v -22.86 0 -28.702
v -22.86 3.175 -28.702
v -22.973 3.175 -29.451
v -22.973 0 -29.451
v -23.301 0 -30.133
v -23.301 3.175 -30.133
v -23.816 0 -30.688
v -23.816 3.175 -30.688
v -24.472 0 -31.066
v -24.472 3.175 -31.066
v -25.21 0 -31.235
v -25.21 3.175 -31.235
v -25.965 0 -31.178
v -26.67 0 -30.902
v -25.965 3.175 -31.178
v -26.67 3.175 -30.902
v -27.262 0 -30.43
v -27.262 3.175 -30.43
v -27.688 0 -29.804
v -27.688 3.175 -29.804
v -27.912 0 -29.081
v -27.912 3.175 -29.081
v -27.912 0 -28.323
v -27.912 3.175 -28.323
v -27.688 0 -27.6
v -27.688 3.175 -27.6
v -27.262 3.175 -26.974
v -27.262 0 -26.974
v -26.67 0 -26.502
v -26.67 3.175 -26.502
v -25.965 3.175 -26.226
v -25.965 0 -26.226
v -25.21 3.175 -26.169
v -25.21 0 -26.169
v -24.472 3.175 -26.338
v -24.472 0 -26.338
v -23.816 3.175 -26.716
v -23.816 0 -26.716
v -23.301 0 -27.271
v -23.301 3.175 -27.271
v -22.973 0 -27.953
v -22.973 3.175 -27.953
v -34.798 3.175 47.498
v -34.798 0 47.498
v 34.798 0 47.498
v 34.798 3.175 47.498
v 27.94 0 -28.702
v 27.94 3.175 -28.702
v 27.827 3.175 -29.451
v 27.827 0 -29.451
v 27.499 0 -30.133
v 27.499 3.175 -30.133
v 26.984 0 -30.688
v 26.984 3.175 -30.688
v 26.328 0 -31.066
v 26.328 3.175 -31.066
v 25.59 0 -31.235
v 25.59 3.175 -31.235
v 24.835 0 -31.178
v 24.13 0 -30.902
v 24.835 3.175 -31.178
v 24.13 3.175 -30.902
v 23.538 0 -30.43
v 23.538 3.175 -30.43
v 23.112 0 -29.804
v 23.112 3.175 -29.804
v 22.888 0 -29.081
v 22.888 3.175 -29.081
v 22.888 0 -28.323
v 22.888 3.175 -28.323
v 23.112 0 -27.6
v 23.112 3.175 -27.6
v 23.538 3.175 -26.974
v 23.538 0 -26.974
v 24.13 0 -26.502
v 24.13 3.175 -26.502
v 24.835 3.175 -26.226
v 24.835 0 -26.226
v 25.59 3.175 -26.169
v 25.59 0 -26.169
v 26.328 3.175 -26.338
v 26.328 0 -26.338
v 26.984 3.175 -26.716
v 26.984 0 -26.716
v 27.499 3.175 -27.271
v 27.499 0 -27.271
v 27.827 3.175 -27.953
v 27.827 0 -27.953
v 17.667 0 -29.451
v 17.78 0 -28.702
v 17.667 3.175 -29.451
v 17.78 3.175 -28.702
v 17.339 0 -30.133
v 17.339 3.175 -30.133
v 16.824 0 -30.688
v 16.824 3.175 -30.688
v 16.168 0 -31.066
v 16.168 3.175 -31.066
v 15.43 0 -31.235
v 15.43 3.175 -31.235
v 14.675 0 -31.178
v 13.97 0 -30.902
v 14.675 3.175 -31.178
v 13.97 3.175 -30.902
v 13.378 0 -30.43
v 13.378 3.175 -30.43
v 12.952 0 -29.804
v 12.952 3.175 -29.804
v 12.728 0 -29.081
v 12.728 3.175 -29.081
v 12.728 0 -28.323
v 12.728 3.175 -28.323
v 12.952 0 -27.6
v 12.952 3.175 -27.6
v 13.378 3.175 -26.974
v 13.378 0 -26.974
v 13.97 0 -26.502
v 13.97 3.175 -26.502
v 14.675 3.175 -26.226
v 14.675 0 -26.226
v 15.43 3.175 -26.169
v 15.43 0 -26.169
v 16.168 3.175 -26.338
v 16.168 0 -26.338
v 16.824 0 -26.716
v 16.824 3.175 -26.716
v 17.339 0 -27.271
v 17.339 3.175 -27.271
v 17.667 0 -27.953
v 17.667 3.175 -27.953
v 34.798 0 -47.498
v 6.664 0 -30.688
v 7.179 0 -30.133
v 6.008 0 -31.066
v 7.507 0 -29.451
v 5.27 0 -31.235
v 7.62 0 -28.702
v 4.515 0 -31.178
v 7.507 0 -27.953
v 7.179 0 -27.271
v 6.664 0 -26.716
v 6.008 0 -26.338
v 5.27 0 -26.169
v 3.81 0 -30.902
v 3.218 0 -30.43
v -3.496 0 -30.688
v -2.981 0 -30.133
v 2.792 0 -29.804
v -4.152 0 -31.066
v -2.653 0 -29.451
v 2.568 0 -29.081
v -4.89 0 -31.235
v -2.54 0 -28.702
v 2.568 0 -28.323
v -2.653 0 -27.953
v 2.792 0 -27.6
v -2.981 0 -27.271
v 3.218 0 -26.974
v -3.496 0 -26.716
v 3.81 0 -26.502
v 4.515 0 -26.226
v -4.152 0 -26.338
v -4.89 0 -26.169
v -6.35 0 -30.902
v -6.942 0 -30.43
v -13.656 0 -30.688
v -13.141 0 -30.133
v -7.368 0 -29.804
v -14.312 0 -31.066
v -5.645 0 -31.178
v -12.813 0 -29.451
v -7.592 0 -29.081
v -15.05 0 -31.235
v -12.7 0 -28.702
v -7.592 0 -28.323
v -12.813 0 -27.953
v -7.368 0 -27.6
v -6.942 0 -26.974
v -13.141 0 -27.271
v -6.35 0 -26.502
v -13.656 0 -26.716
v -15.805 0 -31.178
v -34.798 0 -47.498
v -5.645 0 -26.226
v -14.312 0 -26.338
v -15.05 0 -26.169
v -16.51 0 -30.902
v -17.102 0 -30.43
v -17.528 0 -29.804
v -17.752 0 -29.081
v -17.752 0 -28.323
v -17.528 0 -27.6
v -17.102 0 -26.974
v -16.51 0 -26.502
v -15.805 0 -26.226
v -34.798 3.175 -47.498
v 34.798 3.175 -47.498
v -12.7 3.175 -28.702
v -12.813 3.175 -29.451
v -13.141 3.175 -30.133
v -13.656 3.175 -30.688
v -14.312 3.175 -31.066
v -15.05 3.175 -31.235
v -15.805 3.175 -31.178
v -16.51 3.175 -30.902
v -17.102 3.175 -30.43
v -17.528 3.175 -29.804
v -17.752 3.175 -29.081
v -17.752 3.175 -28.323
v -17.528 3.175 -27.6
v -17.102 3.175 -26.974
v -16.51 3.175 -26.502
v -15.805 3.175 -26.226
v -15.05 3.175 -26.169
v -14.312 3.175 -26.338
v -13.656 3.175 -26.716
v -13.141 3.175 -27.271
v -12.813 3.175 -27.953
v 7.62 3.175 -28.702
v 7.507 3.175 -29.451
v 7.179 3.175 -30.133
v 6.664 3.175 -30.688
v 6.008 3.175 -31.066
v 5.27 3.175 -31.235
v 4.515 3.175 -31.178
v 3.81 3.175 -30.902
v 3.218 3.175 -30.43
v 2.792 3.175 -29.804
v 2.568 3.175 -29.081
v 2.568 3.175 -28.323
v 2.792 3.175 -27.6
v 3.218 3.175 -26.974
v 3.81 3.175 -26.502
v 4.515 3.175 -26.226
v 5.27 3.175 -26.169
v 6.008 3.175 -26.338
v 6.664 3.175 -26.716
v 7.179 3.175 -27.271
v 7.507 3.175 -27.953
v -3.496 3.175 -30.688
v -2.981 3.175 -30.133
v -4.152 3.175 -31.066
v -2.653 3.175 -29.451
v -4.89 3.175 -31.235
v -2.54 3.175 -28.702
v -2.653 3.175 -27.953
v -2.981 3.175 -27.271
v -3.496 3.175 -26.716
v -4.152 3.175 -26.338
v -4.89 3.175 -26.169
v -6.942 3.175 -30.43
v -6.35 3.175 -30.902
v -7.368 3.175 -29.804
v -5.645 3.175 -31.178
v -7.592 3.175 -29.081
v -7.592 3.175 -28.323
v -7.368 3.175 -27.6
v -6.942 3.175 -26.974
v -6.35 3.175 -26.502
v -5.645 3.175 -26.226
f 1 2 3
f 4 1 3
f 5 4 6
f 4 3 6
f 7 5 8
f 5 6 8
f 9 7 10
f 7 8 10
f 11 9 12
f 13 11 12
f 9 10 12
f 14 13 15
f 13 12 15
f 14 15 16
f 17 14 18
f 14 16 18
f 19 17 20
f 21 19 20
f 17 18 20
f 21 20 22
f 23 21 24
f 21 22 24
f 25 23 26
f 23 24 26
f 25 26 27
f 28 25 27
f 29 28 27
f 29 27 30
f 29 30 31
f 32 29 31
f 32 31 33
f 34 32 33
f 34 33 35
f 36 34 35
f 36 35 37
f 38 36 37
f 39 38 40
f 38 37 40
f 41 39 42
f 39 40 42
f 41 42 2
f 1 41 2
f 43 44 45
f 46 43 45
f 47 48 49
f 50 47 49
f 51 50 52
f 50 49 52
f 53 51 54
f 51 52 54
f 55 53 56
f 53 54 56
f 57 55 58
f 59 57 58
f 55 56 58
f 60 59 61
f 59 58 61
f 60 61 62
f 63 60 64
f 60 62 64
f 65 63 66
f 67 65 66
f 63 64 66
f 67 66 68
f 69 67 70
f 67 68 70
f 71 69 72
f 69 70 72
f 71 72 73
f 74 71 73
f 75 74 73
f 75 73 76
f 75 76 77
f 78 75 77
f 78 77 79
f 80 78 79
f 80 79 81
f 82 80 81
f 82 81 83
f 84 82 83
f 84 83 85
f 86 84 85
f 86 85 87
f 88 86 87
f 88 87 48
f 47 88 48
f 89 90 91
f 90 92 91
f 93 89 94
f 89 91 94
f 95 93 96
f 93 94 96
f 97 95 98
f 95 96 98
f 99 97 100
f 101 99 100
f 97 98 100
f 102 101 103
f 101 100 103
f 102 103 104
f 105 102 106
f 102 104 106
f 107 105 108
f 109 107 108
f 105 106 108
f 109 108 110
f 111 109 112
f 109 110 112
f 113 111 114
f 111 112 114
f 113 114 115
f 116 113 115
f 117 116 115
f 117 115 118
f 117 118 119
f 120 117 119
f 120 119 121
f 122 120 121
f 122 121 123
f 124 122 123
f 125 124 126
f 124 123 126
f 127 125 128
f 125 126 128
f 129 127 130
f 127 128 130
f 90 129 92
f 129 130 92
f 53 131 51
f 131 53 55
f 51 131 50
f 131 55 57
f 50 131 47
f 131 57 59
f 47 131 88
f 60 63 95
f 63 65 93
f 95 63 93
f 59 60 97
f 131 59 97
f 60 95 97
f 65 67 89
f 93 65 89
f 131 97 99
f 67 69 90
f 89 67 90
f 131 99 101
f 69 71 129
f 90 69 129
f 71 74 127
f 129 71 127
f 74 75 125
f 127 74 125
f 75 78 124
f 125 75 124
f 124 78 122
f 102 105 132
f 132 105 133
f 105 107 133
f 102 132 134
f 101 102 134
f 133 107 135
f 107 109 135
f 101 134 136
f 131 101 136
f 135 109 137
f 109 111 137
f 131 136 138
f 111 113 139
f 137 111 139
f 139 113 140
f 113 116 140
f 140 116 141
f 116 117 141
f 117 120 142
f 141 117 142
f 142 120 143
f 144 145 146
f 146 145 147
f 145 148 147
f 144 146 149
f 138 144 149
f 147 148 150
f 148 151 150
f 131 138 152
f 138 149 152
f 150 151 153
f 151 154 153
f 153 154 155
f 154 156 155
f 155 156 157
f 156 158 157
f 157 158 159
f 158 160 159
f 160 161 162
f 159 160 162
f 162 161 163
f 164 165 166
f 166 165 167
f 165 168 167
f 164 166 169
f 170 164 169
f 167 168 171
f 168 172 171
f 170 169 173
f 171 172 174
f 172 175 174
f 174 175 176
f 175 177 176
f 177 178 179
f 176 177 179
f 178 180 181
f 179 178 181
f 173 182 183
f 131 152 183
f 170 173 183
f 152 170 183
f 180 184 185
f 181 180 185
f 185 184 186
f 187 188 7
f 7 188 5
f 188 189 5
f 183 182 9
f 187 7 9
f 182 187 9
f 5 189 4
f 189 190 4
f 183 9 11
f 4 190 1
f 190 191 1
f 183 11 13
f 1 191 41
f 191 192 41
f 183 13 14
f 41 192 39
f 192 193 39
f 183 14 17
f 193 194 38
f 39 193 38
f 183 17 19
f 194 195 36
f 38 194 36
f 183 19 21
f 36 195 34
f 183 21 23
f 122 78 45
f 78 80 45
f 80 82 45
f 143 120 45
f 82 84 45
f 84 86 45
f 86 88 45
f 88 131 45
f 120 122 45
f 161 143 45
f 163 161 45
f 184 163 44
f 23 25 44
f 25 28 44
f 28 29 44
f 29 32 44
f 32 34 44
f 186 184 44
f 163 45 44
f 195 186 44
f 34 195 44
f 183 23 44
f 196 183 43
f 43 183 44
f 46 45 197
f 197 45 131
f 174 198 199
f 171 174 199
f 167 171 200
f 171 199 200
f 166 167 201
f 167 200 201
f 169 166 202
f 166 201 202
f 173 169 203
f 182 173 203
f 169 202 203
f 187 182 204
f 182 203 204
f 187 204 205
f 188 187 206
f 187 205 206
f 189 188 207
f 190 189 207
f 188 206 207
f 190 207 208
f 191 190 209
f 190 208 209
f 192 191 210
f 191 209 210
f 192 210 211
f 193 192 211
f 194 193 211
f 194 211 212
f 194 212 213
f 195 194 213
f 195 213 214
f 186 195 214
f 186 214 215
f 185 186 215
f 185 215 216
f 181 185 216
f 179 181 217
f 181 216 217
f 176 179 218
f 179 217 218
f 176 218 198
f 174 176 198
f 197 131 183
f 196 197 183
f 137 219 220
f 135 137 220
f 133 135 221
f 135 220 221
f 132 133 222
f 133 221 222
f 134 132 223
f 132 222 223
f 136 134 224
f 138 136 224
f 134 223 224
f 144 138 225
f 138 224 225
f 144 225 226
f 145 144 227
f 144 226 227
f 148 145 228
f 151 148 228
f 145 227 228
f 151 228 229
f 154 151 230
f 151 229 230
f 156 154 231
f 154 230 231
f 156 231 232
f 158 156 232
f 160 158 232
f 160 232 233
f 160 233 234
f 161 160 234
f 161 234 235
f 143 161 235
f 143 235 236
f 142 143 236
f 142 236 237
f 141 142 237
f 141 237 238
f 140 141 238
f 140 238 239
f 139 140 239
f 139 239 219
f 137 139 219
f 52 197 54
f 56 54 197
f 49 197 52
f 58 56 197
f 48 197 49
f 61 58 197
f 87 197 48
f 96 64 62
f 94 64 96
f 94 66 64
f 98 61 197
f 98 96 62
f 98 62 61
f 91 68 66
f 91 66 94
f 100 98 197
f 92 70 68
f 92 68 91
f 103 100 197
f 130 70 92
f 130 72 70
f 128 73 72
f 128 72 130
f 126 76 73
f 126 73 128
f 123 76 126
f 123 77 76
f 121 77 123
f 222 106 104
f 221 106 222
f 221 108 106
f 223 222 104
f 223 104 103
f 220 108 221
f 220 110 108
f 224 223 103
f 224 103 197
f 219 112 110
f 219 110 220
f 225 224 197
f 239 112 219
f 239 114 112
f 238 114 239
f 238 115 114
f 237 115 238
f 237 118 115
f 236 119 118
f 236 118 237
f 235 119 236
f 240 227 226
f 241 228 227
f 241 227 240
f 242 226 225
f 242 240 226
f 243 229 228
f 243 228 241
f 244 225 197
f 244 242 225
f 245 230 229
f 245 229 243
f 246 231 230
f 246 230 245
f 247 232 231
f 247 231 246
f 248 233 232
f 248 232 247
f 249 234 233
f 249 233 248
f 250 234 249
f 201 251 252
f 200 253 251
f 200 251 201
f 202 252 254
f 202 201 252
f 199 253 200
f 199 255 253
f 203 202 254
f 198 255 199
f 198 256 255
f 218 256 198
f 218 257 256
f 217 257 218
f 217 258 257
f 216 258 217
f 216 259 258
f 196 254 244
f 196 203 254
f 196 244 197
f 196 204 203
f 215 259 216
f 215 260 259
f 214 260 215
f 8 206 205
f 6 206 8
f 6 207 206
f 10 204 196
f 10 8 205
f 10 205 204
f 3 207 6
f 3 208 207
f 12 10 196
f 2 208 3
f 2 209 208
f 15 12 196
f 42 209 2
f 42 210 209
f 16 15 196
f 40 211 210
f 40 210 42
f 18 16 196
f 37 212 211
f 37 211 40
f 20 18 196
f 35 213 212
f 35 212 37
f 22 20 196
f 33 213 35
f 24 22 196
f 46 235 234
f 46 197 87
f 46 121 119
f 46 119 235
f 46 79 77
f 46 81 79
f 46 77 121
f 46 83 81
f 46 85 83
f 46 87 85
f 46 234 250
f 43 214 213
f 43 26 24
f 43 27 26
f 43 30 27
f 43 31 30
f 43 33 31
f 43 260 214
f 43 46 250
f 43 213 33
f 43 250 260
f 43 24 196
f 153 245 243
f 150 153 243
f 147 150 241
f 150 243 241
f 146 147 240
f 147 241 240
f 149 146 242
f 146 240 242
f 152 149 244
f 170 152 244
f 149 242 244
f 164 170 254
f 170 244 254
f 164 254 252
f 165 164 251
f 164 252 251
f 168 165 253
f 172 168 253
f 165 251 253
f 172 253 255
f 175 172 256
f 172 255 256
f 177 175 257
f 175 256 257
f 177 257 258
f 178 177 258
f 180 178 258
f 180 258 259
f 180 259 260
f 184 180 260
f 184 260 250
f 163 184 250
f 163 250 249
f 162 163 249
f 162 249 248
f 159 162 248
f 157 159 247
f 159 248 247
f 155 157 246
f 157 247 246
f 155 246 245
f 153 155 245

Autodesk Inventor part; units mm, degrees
ref_plane "YZ Plane" through (0, 0, 0) normal (1, 0, 0) x (0, 1, 0)
ref_plane "XZ Plane" through (0, 0, 0) normal (0, 1, 0) x (-1, 0, 0)
ref_plane "XY Plane" through (0, 0, 0) normal (0, 0, 1) x (1, 0, 0)
sketch "Sketch1" plane through (0, 0, 0) normal (0, 1, 0) x (-1, 0, 0)
  line L0 (34.798, 47.498) -> (-34.798, 47.498)
  line L1 (-34.798, 47.498) -> (-34.798, -47.498)
  line L2 (-34.798, -47.498) -> (34.798, -47.498)
  line L3 (34.798, -47.498) -> (34.798, 47.498)
  point P0 (0, 0)
  dimension "d0" = 47.498
  dimension "d1" = 94.996
  dimension "d2" = 69.596
  dimension "d3" = 34.798
extrude "Extrusion1" add sketch "Sketch1" along normal blind 3.175
sketch "Sketch2" plane through (0, 3.175, 0) normal (0, 1, 0) x (1, 0, 0)
  line L0 (-34.798, -47.498) -> (34.798, -47.498) projected
  line L1 (0, -47.498) -> (0, 28.702) construction
  line L2 (-34.798, 47.498) -> (-34.798, -47.498) projected
  line L3 (-34.798, 28.702) -> (32.4262, 28.702) construction
  circle A0 centre (-5.08, 28.702) radius 2.54
  circle A1 centre (-15.24, 28.702) radius 2.54
  circle A2 centre (-25.4, 28.702) radius 2.54
  circle A3 centre (5.08, 28.702) radius 2.54
  circle A4 centre (15.24, 28.702) radius 2.54
  circle A5 centre (25.4, 28.702) radius 2.54
  point P0 (0, 0)
  dimension "d6" = 5.08
  dimension "d7" = 10.16
  dimension "d8" = 10.16
  dimension "d9" = 76.2
  dimension "d10" = 5.08
extrude "Extrusion2" cut sketch "Sketch2" against normal blind 3.175
equation "\"d0\" = 0.5 * d1"
equation "\"d3\" = 0.5 * d2"
properties part number "sheild"
